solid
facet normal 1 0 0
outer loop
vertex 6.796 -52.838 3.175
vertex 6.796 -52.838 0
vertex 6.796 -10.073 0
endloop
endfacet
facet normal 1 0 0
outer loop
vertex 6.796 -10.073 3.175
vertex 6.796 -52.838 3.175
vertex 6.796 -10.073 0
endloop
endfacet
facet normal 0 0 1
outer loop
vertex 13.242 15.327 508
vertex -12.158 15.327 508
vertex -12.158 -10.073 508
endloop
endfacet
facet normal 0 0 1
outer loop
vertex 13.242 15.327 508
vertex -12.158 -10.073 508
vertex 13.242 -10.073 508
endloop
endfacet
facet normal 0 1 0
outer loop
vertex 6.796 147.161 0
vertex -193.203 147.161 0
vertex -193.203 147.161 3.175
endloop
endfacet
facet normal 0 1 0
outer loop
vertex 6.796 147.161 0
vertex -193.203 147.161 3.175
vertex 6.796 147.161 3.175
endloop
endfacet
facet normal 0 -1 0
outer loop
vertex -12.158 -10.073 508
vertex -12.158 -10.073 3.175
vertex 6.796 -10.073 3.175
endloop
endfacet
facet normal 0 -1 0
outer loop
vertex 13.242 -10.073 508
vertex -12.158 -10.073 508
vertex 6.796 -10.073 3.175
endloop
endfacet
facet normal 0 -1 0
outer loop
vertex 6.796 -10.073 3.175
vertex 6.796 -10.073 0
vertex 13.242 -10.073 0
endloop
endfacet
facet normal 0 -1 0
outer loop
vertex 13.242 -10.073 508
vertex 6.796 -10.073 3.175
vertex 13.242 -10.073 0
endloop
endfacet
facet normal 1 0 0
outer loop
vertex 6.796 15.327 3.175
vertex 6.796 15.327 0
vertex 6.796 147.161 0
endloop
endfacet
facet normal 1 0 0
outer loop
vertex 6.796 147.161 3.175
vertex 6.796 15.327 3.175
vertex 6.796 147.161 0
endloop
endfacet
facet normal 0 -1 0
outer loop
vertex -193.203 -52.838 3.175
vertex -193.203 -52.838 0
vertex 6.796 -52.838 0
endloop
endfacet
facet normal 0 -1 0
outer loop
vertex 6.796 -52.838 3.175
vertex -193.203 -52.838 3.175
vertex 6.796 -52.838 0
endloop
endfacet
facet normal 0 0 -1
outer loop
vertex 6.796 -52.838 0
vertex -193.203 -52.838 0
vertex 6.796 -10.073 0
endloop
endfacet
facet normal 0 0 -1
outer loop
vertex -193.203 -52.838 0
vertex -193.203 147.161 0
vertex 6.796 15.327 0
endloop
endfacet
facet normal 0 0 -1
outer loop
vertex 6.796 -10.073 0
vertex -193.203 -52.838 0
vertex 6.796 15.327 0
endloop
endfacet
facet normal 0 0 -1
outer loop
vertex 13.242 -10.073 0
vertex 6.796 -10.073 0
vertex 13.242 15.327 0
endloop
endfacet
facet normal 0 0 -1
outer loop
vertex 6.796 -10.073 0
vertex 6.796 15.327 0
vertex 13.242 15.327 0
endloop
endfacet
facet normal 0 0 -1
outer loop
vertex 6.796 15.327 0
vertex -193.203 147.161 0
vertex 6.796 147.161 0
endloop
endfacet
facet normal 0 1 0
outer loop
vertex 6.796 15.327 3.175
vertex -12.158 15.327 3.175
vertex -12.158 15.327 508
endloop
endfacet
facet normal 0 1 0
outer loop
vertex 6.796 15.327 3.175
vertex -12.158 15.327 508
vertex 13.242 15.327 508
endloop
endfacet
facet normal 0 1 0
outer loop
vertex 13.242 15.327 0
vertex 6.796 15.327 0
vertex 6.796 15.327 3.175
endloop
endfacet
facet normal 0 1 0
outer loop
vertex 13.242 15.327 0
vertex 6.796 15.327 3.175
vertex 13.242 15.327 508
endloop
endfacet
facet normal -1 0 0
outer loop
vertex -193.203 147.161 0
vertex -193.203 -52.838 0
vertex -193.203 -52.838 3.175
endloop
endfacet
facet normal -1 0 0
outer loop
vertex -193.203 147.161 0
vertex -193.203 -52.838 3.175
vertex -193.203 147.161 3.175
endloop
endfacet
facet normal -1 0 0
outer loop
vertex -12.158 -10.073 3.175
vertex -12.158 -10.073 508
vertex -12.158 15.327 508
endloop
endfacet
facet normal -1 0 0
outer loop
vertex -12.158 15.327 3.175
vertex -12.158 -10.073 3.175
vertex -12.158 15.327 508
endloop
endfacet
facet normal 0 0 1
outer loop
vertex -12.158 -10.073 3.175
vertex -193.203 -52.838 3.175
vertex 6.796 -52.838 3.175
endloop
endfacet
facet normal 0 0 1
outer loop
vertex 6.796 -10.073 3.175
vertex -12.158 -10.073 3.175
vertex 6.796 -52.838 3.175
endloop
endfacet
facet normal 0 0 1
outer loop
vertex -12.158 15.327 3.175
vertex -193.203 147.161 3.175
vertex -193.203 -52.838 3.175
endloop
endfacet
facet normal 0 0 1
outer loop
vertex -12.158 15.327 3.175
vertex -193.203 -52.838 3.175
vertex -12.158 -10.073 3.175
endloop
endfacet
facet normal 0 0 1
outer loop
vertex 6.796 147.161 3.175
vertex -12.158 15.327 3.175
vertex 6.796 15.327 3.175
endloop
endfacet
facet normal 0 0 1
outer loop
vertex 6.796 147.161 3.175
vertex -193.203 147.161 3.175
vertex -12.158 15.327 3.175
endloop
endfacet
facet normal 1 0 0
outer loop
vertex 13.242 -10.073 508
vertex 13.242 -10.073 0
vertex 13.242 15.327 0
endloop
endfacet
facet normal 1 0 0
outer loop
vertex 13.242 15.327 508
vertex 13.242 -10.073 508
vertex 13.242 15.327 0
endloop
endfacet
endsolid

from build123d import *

# Parameters (mm, degrees)
F0_W     = 25.4
F0_H     = 25.4
F1_DEPTH = 508
F2_DEPTH = 355.6
F3_W     = 199.9996
F3_H     = 199.9996
F4_DEPTH = 3.175


with BuildPart() as f1:
    # F0 (on Top) → F1 (new body)
    with BuildSketch(Plane.XY):
        with Locations((0.54235, 2.626543)):
            Rectangle(F0_W, F0_H)
    extrude(amount=F1_DEPTH)

    # F0 (on Top) → F2 (join)
    with BuildSketch(Plane.XY):
        with Locations((0.54235, 2.626543)):
            Rectangle(F0_W, F0_H)
    extrude(amount=F2_DEPTH)

    # F3 (on Top) → F4 (join)
    with BuildSketch(Plane.XY):
        with Locations((-93.20364, 47.161473)):
            Rectangle(F3_W, F3_H)
    extrude(amount=F4_DEPTH)


solid = f1.part
